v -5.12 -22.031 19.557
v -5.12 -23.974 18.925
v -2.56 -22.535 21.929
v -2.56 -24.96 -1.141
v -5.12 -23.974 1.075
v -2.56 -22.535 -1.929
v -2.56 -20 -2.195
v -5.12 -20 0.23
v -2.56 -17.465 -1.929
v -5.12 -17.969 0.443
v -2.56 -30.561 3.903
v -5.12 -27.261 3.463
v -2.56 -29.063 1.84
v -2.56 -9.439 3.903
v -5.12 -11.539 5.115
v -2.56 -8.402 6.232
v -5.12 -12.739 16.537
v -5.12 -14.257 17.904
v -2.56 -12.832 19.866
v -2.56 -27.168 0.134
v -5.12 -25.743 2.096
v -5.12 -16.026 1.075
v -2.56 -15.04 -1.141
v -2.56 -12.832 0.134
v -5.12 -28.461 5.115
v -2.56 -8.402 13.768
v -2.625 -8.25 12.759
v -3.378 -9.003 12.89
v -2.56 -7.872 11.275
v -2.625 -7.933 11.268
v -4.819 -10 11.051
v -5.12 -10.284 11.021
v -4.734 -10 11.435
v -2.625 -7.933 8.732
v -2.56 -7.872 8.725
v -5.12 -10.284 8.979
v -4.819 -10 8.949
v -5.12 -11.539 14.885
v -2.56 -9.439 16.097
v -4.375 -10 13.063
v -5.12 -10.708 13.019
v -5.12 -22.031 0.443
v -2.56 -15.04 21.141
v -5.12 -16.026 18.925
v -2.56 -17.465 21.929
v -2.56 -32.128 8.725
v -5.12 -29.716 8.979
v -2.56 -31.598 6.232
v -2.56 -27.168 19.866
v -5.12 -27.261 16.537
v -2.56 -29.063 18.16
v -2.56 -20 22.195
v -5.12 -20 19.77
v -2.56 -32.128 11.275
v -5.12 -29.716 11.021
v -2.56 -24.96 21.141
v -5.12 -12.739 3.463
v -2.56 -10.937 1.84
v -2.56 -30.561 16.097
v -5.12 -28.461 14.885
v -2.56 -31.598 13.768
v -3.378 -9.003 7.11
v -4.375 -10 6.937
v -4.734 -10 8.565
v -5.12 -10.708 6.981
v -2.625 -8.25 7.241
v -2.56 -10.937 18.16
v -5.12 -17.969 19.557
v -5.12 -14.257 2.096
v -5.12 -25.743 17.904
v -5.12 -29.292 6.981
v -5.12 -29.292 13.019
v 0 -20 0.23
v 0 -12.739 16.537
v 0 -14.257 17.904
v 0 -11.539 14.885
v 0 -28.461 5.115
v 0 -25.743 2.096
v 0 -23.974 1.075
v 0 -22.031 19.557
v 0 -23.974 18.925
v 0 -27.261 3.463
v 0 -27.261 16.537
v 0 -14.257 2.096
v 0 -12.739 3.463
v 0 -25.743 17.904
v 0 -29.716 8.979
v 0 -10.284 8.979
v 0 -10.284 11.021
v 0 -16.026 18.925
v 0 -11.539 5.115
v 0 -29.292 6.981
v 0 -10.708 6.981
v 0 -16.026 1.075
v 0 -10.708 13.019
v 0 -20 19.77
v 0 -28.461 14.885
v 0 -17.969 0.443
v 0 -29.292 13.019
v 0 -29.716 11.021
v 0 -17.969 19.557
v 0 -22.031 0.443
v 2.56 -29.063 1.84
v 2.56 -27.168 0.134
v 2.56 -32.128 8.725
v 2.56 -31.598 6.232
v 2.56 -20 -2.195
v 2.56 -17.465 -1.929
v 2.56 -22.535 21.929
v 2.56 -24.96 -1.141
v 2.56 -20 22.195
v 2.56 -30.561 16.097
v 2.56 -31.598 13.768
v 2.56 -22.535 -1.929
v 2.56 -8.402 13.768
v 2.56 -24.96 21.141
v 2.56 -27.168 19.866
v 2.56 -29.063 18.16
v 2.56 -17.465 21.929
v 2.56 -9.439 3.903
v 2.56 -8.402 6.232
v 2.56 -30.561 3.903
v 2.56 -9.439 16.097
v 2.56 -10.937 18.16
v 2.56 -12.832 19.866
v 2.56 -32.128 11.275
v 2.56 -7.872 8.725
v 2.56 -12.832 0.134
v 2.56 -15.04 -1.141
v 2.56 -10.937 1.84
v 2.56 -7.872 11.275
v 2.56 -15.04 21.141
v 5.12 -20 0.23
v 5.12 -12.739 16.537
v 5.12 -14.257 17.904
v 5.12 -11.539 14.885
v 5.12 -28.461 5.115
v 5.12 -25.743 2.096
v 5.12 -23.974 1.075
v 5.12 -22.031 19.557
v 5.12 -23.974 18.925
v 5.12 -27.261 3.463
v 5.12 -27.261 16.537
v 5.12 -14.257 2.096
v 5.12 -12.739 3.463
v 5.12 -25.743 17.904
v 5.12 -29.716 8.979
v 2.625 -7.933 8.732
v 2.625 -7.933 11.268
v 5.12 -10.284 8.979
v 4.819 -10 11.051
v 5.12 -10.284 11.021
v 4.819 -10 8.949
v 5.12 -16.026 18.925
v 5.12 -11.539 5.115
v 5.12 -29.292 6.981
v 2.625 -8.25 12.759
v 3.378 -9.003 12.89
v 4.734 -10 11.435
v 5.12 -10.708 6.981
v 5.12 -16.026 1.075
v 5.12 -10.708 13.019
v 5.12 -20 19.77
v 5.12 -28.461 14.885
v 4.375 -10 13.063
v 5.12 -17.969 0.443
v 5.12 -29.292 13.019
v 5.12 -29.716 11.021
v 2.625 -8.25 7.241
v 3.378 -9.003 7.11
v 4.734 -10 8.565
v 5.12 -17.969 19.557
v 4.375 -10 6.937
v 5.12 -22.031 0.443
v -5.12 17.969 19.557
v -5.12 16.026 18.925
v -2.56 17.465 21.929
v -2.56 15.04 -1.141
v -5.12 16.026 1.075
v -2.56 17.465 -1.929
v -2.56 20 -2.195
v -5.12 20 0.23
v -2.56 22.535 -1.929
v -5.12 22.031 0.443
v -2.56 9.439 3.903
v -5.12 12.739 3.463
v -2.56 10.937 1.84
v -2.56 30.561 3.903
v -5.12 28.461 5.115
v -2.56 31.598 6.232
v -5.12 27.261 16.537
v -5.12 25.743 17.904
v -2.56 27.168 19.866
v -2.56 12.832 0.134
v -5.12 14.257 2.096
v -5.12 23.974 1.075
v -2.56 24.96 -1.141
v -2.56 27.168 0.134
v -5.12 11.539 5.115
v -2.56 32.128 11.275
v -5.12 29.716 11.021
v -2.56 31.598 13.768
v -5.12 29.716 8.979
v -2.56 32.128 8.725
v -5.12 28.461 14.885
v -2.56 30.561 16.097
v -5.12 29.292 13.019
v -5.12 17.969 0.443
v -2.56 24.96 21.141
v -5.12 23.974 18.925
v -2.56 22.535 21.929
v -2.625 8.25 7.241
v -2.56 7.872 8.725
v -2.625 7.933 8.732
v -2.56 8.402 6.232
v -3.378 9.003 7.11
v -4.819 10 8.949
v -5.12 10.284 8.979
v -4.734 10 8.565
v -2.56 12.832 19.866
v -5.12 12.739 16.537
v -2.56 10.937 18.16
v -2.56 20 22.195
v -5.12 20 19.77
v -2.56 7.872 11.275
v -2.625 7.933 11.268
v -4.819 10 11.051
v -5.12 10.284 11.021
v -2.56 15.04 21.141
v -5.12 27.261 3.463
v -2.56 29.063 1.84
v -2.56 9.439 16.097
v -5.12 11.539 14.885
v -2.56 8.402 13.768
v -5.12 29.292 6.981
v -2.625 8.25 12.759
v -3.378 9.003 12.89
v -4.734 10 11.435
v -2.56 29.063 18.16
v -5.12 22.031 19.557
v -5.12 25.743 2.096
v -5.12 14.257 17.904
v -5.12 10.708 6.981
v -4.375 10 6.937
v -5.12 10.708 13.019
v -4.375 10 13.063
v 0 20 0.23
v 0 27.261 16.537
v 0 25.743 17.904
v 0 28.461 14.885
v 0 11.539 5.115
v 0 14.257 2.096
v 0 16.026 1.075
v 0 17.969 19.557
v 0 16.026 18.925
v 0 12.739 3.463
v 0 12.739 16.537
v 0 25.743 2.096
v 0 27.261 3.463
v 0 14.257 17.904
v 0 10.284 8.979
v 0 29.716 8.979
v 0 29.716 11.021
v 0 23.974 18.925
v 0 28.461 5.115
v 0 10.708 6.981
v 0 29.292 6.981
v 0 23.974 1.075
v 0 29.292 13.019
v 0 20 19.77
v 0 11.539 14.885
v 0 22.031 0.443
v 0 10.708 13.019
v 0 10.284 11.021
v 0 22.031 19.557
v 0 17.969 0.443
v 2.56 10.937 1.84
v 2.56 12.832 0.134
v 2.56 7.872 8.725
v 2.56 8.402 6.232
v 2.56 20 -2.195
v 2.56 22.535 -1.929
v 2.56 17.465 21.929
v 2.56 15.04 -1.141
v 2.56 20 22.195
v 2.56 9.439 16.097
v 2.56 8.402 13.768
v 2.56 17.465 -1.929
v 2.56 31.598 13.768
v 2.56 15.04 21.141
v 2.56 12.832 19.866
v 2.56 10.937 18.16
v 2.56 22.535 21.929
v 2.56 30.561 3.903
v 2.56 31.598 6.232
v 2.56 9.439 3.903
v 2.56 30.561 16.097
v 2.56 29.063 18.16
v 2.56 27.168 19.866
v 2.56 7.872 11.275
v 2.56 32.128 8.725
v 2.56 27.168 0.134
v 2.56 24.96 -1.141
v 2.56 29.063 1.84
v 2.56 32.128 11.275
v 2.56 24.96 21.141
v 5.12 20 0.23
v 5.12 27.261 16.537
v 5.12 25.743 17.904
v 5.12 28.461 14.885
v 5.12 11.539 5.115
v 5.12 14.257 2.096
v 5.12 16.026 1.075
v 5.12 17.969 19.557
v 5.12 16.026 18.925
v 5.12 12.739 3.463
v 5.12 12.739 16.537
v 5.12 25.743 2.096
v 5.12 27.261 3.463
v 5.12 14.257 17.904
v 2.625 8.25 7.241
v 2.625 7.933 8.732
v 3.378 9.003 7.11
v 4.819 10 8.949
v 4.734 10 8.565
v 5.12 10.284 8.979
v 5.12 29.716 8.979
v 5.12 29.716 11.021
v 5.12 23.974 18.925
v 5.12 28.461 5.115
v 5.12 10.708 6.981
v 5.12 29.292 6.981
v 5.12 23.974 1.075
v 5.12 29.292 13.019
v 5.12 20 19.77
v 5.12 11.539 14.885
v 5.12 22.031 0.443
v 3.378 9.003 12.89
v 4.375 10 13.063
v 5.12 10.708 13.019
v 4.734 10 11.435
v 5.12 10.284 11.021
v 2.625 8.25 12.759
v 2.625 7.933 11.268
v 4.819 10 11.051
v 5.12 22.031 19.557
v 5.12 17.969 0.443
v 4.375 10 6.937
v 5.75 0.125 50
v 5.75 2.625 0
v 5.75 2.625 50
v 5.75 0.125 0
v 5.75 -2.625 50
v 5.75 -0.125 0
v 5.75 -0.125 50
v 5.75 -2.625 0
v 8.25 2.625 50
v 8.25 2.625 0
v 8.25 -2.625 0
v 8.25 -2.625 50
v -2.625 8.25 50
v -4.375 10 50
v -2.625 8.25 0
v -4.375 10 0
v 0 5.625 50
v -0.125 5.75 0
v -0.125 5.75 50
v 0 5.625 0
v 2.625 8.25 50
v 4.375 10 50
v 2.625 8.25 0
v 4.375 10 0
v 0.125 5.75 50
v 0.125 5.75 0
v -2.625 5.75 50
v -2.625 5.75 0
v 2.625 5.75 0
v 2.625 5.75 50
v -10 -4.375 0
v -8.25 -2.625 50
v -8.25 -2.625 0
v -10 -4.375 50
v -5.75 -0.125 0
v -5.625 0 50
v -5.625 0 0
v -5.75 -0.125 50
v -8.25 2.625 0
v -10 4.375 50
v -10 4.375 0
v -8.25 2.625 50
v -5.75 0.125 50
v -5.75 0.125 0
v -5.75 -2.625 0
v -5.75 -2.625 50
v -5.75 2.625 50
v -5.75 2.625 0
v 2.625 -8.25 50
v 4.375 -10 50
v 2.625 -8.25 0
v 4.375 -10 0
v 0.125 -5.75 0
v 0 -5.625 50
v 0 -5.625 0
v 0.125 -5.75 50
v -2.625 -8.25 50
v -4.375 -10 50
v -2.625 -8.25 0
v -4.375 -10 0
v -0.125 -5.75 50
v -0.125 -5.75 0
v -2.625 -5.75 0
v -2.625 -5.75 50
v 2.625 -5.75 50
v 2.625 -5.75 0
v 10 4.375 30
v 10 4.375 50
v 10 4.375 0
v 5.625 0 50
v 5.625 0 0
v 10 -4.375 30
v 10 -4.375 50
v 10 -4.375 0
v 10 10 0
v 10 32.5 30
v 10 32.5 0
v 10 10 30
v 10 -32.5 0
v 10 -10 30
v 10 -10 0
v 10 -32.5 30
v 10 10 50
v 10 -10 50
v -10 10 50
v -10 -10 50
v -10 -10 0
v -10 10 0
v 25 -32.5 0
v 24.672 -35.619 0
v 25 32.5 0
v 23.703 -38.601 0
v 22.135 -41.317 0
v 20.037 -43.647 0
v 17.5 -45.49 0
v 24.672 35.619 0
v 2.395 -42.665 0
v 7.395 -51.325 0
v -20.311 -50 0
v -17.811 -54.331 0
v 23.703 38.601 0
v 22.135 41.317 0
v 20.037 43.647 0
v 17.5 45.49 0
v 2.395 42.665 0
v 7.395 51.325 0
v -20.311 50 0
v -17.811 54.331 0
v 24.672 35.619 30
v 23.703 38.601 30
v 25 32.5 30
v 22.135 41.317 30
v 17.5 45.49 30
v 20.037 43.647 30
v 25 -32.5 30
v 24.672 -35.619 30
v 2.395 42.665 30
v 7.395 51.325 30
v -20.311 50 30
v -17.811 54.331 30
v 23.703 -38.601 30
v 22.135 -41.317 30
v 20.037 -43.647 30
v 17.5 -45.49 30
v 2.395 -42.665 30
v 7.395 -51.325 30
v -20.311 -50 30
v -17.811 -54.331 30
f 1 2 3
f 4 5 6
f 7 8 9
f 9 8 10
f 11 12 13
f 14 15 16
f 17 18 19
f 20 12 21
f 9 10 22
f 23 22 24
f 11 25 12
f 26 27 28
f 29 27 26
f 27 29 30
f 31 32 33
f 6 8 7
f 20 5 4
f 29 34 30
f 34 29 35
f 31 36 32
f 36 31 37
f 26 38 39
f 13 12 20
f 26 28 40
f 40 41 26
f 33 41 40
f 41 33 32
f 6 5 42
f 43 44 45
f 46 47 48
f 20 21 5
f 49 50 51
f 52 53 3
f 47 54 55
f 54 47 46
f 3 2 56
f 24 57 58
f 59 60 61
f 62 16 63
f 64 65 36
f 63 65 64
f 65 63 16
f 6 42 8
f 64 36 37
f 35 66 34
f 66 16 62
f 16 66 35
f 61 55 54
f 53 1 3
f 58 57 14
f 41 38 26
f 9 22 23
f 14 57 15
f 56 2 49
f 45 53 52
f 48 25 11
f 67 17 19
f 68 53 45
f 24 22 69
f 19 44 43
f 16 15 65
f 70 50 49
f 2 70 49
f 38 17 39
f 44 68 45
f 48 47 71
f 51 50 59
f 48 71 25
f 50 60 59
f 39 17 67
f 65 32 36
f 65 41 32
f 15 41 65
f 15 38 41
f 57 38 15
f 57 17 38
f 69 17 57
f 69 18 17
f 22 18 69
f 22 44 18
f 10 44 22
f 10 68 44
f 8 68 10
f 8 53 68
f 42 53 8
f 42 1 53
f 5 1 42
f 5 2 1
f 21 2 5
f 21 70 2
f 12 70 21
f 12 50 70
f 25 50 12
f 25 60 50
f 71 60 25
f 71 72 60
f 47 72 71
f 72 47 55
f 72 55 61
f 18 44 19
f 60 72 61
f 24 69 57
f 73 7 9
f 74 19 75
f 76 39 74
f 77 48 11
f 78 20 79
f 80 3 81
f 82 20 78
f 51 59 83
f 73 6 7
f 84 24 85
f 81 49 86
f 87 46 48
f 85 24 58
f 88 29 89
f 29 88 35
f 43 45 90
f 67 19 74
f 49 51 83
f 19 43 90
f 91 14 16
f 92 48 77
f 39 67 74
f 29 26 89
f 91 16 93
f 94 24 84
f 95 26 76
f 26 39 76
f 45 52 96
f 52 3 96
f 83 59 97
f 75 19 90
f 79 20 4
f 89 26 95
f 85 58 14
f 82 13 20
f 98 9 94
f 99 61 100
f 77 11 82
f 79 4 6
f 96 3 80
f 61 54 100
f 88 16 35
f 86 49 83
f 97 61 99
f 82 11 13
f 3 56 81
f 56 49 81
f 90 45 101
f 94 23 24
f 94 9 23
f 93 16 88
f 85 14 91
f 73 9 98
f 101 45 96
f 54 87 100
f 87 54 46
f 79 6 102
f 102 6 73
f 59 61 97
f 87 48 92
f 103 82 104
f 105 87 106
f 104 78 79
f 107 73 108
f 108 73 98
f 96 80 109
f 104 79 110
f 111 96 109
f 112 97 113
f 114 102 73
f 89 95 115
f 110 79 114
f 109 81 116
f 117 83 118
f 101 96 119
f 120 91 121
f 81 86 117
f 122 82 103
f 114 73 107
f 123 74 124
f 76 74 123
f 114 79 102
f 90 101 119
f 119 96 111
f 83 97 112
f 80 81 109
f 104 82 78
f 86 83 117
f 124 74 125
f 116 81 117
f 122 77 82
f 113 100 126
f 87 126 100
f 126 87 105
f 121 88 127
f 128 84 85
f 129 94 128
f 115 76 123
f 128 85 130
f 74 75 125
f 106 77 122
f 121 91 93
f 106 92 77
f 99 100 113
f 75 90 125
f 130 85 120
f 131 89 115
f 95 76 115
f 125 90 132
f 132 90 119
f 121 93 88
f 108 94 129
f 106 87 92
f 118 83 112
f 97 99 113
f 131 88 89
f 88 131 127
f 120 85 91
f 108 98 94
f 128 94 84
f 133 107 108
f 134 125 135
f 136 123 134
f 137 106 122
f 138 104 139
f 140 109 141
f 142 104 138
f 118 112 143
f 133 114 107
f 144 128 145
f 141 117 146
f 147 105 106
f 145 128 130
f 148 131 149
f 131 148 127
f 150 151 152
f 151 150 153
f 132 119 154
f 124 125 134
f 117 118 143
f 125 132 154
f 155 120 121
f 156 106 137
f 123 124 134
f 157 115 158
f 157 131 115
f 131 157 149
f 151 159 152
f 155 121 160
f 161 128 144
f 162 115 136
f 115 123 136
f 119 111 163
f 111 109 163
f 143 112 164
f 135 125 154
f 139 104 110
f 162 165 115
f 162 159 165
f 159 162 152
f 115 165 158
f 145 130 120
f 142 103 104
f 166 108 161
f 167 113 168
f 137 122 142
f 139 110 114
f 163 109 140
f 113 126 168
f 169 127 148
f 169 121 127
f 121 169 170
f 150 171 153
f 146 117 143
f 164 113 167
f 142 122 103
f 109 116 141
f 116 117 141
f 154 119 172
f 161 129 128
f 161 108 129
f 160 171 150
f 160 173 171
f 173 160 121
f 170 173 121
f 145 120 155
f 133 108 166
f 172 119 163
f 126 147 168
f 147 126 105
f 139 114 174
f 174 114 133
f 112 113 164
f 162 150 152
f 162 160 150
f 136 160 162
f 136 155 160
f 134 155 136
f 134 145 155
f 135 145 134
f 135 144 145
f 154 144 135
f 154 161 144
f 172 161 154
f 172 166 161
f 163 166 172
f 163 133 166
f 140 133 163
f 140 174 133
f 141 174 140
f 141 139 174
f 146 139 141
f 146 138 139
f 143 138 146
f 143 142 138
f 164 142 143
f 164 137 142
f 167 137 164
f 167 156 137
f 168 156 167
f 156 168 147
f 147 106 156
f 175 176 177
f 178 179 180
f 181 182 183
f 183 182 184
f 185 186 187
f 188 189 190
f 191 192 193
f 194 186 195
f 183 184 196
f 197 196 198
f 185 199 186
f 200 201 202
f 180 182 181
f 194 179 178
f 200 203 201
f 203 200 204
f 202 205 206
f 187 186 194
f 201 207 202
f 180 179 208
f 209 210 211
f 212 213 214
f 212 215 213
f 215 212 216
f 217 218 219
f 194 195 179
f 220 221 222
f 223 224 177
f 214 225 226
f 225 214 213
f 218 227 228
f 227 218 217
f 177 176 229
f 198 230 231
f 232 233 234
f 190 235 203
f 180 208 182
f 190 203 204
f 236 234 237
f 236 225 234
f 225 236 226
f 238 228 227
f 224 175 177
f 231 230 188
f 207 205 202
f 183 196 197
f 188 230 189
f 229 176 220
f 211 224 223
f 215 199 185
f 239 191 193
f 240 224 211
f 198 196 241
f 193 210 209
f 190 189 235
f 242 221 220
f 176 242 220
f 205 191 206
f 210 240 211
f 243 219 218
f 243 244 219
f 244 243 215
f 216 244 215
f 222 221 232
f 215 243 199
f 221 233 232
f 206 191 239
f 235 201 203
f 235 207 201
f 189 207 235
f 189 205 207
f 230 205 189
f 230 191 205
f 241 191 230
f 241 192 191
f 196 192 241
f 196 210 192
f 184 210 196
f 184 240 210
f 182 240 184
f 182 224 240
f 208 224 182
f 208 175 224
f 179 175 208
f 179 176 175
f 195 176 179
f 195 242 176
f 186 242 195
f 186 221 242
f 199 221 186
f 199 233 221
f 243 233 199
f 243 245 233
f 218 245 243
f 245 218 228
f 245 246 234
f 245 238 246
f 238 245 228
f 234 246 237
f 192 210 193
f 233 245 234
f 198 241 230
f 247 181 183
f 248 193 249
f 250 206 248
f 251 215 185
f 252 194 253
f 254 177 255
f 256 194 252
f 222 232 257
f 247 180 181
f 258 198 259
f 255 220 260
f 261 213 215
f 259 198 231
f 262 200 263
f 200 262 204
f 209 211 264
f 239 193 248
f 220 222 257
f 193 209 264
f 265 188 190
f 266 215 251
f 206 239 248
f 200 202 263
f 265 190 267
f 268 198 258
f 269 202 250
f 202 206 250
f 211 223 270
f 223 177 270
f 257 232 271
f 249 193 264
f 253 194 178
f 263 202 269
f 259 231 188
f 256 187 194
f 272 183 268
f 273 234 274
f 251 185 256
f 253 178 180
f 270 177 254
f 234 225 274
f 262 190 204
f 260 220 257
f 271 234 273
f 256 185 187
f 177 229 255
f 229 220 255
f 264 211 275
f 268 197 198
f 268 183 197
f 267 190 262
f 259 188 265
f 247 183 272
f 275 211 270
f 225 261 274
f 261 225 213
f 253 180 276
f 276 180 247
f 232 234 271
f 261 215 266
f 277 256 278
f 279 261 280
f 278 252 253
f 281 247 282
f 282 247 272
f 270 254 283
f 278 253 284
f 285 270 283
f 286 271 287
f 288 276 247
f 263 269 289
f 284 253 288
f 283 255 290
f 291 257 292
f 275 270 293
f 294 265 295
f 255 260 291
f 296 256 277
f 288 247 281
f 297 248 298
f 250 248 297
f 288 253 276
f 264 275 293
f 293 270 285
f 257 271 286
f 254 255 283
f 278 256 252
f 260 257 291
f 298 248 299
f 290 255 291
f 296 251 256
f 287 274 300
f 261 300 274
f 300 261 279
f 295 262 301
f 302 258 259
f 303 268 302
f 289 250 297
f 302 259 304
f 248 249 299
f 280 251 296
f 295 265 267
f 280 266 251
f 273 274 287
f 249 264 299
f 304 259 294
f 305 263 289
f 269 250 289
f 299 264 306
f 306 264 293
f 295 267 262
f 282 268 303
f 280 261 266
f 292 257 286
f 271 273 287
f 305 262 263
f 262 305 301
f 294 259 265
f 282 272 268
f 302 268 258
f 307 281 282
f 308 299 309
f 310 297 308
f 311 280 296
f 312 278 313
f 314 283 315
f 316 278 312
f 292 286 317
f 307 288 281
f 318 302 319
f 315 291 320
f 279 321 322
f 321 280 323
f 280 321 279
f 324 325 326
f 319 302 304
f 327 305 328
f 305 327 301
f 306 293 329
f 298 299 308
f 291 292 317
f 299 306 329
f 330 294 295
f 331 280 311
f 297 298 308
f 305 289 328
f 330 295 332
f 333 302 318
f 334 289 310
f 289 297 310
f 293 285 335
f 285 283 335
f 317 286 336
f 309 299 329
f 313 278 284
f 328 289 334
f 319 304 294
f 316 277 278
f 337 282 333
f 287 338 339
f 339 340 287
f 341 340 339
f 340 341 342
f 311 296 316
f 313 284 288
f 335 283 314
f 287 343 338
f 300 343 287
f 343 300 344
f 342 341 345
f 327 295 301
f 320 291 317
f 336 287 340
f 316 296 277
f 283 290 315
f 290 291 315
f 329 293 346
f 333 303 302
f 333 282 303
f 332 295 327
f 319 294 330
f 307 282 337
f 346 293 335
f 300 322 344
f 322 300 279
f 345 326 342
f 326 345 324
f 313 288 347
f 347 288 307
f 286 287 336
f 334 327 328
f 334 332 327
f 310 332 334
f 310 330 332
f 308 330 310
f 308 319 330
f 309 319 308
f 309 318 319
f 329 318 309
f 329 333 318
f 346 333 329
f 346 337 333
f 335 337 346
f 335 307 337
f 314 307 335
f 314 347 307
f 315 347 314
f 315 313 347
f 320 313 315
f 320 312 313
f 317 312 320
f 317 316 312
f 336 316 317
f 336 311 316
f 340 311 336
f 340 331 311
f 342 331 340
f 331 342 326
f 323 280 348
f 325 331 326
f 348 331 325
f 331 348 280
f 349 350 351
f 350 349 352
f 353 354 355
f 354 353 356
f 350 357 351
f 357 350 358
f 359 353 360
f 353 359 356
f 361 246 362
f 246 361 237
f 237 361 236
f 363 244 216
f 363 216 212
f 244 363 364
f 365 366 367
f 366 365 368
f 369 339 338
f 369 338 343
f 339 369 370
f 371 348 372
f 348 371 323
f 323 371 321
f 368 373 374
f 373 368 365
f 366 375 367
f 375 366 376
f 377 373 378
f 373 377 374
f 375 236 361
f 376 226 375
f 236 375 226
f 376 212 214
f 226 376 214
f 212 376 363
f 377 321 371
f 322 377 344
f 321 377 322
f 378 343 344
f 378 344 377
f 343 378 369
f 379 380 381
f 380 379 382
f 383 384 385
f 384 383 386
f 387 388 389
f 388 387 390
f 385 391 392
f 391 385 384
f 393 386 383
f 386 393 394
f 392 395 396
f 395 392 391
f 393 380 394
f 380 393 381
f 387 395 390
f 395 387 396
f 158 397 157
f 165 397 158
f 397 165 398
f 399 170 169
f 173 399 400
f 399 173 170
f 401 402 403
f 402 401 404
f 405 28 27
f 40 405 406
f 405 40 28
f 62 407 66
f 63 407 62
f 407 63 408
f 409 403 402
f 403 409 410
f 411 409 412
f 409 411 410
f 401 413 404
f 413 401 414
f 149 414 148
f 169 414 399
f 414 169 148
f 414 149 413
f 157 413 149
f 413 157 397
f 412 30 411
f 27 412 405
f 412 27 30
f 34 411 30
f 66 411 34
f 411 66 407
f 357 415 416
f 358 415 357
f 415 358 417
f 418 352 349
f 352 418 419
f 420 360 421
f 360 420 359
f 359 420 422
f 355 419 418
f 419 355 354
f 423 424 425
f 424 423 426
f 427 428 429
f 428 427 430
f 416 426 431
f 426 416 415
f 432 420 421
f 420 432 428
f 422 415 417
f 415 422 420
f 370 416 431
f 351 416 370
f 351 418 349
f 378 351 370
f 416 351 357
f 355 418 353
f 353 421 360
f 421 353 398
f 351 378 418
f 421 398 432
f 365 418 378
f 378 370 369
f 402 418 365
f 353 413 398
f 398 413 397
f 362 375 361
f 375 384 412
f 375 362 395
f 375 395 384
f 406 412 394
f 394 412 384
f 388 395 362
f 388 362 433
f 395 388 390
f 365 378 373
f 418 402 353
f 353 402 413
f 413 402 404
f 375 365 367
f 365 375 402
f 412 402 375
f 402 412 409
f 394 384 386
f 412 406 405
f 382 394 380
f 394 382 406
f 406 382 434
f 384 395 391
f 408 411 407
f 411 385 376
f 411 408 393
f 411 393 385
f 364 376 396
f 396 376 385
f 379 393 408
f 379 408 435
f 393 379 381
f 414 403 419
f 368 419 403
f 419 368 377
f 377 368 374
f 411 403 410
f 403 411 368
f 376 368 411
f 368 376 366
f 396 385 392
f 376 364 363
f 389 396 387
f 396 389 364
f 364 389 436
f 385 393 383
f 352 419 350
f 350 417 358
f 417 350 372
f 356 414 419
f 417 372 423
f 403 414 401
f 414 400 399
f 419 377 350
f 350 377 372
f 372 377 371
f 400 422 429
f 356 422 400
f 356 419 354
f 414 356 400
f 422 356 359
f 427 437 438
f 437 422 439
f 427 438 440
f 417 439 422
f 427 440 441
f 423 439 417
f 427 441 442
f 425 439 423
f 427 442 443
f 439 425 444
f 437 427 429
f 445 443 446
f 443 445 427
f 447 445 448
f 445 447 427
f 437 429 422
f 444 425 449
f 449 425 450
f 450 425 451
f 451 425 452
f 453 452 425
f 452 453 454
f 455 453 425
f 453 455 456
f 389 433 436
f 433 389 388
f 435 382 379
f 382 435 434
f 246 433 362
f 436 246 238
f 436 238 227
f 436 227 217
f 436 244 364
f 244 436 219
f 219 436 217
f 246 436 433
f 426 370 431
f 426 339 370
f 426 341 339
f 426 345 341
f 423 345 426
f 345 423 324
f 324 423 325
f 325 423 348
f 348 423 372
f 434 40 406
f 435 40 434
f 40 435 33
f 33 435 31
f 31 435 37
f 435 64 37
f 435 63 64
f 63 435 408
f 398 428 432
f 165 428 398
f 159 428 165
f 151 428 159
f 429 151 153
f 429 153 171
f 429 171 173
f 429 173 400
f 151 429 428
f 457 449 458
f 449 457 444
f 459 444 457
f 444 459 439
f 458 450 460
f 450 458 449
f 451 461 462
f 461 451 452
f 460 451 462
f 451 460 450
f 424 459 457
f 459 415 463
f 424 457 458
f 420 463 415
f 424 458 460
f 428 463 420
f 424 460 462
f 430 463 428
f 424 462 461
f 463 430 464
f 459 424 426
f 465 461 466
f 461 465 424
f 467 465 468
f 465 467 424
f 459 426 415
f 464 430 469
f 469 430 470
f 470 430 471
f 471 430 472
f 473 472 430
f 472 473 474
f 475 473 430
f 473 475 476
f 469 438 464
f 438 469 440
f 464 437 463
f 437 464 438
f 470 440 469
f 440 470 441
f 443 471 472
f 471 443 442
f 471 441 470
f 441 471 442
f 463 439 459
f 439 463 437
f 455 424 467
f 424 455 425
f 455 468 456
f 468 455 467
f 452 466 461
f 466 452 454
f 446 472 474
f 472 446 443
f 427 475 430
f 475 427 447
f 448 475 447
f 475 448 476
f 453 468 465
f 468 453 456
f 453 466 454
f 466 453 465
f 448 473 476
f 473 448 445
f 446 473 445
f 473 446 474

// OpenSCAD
// file: ../configuration.scad
// Increase this if your slicer or printer make holes too tight.
extra_radius = 0.25;

// OD = outside diameter, corner to corner.
m3_nut_od = 6.1; //6.1 for 1515
m3_nut_radius = m3_nut_od/2 + 0.2 + extra_radius;
m3_washer_radius = 3.5 + extra_radius;


// Major diameter of metric 3mm thread.
m3_major = 2.85;
m3_radius = m3_major/2 + extra_radius;
m3_wide_radius = m3_major/2 + extra_radius + 0.2;


m5_nut_od = 8; 
m5_nut_radius = m5_nut_od/2 + 0.2 + extra_radius;
m5_washer_radius = 3.5 + extra_radius;

// Major Diameter of metric 5mm thread
m5_major = 5;
m5_radius = m5_major/2 + extra_radius;
m5_wide_radius = m5_major/2 + extra_radius + 0.2;

m5_cap_major = 8.5;
m5_cap_radius = m5_cap_major/2 + extra_radius;


// NEMA17 stepper motors.
motor_shaft_diameter = 5;
motor_shaft_radius = motor_shaft_diameter/2 + extra_radius;

// Frame brackets. M3x8mm screws work best with 3.6 mm brackets.
thickness = 4;

// OpenBeam or Misumi. Currently only 15x15 mm, but there is a plan
// to make models more parametric and allow 20x20 mm in the future.
extrusion = 20;
extrusion_channel_w = 5; //use 3 for 1515
extrusion_channel_d = 3; //use 3 for 1515
extrusion_fin_d = 1;

vertex_radius = 40.5; //set to 36 for 1515
vertex_x_offset = 7.25; // offset of the horizontal extrusion to the vertical one in X axis
vertex_y_offset = 39 ;//27; // offset of the horizontal extrusion to the vertical one in Y axis


// Placement for the NEMA17 stepper motors.
motor_offset = 44;
motor_length = 47;
// file: ../vertex.scad
include <configuration.scad>;

$fn = 80;
roundness = 6;

body1_cylinder_offset = 22;  //22
body2_cylinder_offset = -30; //-37

module extrusion_cutout(h, extra, cut_w=2, cut_d=2, corner_r=0.5) {
	difference() {
		union(){
			cube([extrusion+extra, extrusion+extra, h], center=true);
			translate([(extrusion-corner_r)/2,(extrusion-corner_r)/2,0]) cylinder(h=h, r=corner_r,center=true);
			translate([(extrusion-corner_r)/2,-(extrusion-corner_r)/2,0]) cylinder(h=h, r=corner_r,center=true);
			translate([-(extrusion-corner_r)/2,(extrusion-corner_r)/2,0]) cylinder(h=h, r=corner_r,center=true);
			translate([-(extrusion-corner_r)/2,-(extrusion-corner_r)/2,0]) cylinder(h=h, r=corner_r,center=true);
		}
		for (a = [0:90:359]) rotate([0, 0, a]) {
			translate([(extrusion-cut_d)/2+0.5, 0, 0]) cube([cut_d, cut_w, h+1], center=true);
		}

	}
}

module screw_socket() {
	cylinder(r=m5_wide_radius, h=20, center=true);
	translate([0, 0, 3.8]) cylinder(r=m5_cap_radius, h=8);
}

module screw_socket_cone() {
	union() {
		screw_socket();
		scale([1, 2, -1]) rotate(45)cylinder(r1=11/2*sqrt(2), r2=extrusion/2, h=5.5, $fn=4);
	}
}

module fin(fin_l=50, fin_w=2, fin_d=2){
	translate([0,0,-3.65])rotate([45,0,0])cube([fin_l,2,3,],center=true);
	rotate([90,22.5,90])cylinder(h=fin_l, r=fin_d/2, center=true, $fn = 8);
	//echo("In fin");
}

module vertex(height, idler_offset, idler_space, fin_w=5, fin_d=2, fins=0, fn=180) {

	fin_w = 5.8;
	translate([0,2.5,0])union() {
		// Pads to improve print bed adhesion for slim ends.
		translate([-37.5, 52.2, -height/2]) cylinder(r=8, h=0.4);
		translate([37.5, 52.2, -height/2]) cylinder(r=8, h=0.4);



		difference() {
			union() {
				//fins
				if(fins > 0){
					translate([29.5,35,(height-extrusion)/2]) rotate([0,0,60])  
					difference(){ 
						fin(54,fin_d,fin_w+2);
						translate([-16,-1.6,0])rotate([90,45,0]) cylinder(r=9, h=5.5, $fn=4);
						translate([18,-1.6,0])rotate([90,45,0]) cylinder(r=9, h=5.5, $fn=4);
					}
					translate([29.5,35,-(height-extrusion)/2]) rotate([0,0,60]) 
					difference(){ 
						fin(54,fin_d,fin_w+2);
						translate([-16,-1.6,0])rotate([90,45,0]) cylinder(r=9, h=5.5, $fn=4);
						translate([18,-1.6,0])rotate([90,45,0]) cylinder(r=9, h=5.5, $fn=4);
					}
					translate([-29.5,35,(height-extrusion)/2]) rotate([0,0,-60]) 
					difference(){ 
						fin(54,fin_d,fin_w+2);
						translate([-18,-1.6,0])rotate([90,45,0]) cylinder(r=9, h=5.5, $fn=4);
						translate([16,-1.6,0])rotate([90,45,0]) cylinder(r=9, h=5.5, $fn=4);
					}
					
					translate([-29.5,35,-(height-extrusion)/2]) rotate([0,0,-60]) 
					difference(){ 
						fin(54,fin_d,fin_w+2);
						translate([-18,-1.6,0])rotate([90,45,0]) cylinder(r=9, h=5.5, $fn=4);
						translate([16,-1.6,0])rotate([90,45,0]) cylinder(r=9, h=5.5, $fn=4);
					}
				}
				intersection() {
					translate([0, body1_cylinder_offset, 0]) cylinder(r=vertex_radius, h=height, center=true, $fn=fn*2);
					translate([0, body2_cylinder_offset, 0]) rotate([0, 0, 30]) cylinder(r=50, h=height+1, center=true, $fn=6);
				}
				translate([0, 38, 0]) intersection() {
					rotate([0, 0, -90]) cylinder(r=55, h=height, center=true, $fn=3);
					translate([0, 10, 0]) cube([100, 100, 2*height], center=true);
					translate([0, -10, 0]) rotate([0, 0, 30]) cylinder(r=55, h=height+1, center=true, $fn=6);
				}
			}
			difference() {   
				translate([0, 58, 0]) minkowski() {
					intersection() {
						rotate([0, 0, -90]) cylinder(r=55, h=height, center=true, $fn=3);
						translate([0, -31, 0])  cube([100, 15, 2*height], center=true);
					}
					cylinder(r=roundness, h=1, center=true);
				}

				// Idler support cones.
				translate([0, 26+idler_offset-30, 0]) rotate([-90, 0, 0]) cylinder(r1=30, r2=2, h=30-idler_space/2, $fn=fn);
				translate([0, 26+idler_offset+30, 0]) rotate([90, 0, 0])  cylinder(r1=30, r2=2, h=30-idler_space/2, $fn=fn);
			}

			translate([0, 58, 0]) minkowski() {
				intersection() {
					rotate([0, 0, -90]) cylinder(r=55, h=height, center=true, $fn=3);
					translate([0, 7, 0]) cube([100, 30, 2*height], center=true);
				}
				cylinder(r=roundness, h=1, center=true);
			}

			translate([0,-2.5,0])extrusion_cutout(height+10, 0.15, fin_w, fin_d,corner_r=1);

			for (z = [-height/2 + extrusion/2 , height/2 - extrusion/2] ) {
				translate([0, -extrusion/2-extra_radius+extrusion_fin_d-2.5, z]) rotate([90, 0, 0]) screw_socket_cone();
				for (a = [-1, 1]) {
					rotate([0, 0, 30*a]) translate([-(vertex_radius-body1_cylinder_offset)*a, 111, z]) {
						// % rotate([90, 0, 0]) extrusion_cutout(200, 0);
						// Screw sockets.
						for (y = [-82, -48]) {
							translate([a*(extrusion/2-0.6), y, 0]) rotate([0, a*90, 0]) screw_socket();
						}
						
						// Nut tunnels.
						for (z = [-1, 1]) {
							scale([1, 1, z]) 
							translate([0, -99, 3]) 
							minkowski() {
								rotate([0, 0, -a*30]) cylinder(r=5, h=16); //cylinder(r=m3_nut_radius, h=16);
								cube([0.1, 8, 0.1], center=true);
							}
						}
					}
				}
			}
			// ease the inside coners
			rotate(-30)translate([vertex_x_offset+2,-2.5+vertex_y_offset/2+1,0])cylinder(h=height+1, r=1, center=true);
			rotate(30)translate([-vertex_x_offset-2,-2.5+vertex_y_offset/2+1,0])cylinder(h=height+1, r=1, center=true);
		}
	}
}



translate([0, 0, extrusion*2.5/2]) 
vertex(extrusion*2.5, idler_offset=0, idler_space=10, fin_w=5, fin_d=4, fins=1, fn=20 );


//use <Lateral_Brace/LateralBrace.scad>
//rotate([0,0,270])brace();
//translate([34.5,25,10])rotate([30-90,90,0])Extrusion(height = 30);


//translate([0, 0, 7.5]) vertex_cover(3);

//%rotate(-30)cube([45,vertex_y_offset/2,25]);
//%rotate(-30)cube([vertex_x_offset,45,35]);
/*
//%rotate(-30)cube([45,vertex_y_offset/2,25]);
color("gray")rotate(-30)translate([(extrusion-thickness)/2,vertex_y_offset/2,0])
difference(){ 
cube([extrusion,240,extrusion]);
translate([(extrusion-extrusion_channel_w)/2,-1,extrusion-6]) cube([extrusion_channel_w,241,extrusion]);
}
*/
/*
color("gray")
rotate(-30)translate([(extrusion-thickness)/2,vertex_y_offset/2,0])
translate([10,0,10+30])rotate([-90,0,0])
difference(){
	import("./assembly/2020_1000mm.stl", convexity=10);
	translate([-12,-12,240])cube([24,24,(1000-240)+2]);
}

#translate([sin(30)*(vertex_y_offset+240),cos(30)*(vertex_y_offset+240),0])rotate(120)
translate([0, 0, extrusion*2.5/2]) vertex(extrusion*2.5, idler_offset=0, idler_space=10, fin_w=5, fin_d=4, fn=20 );
translate([sin(30)*(vertex_y_offset/2+240),cos(30)*(vertex_y_offset/2+240),-1])%rotate(-30)cube([45,vertex_y_offset/2,25]);
*/
// main file
$fn=30;
use <../vertex.scad>
//#translate([-26.475,-22.575,0])import (file = "V-slot 2020_fullscale.dxf");
//translate([30,0,-15])import("v-slot_endcap_2020.stl");

extrusion = 20;


module Extrusion(height = 10, cut_d=4.5, cut_w=5.5, extra = .25){
	cut_d = cut_d-extra;
	cut_w = cut_w-extra;
	difference(){
		translate([-extrusion/2,-extrusion/2,0]) cube([extrusion,extrusion,height]);

		for(i = [0:3]){
			rotate([0,0,90*i]){
				translate([extrusion/2-cut_d,-cut_w/2,-1])cube([cut_d,cut_w,height+2]);
				translate([0,5.375+extra,-1])rotate([0,0,45])cube([10,10,height+2]);
			}
		}
	}
	for(i=[0:3]){
	rotate([0,0,90*i]){
	//translate([extrusion/2,extrusion/2,-1])cylinder(r=1, h=height+2);
	}
	}
}
module wheel(){
translate([-5.12,0,0])
rotate([0,90,0]){
cylinder(r1=9.77, r2=24.39/2, h=5.12/2);
translate([0,0,5.12/2])cylinder(r1=24.39/2, r2=9.77, h=5.12/2);
translate([0,0,5.12])cylinder(r1=9.77, r2=24.39/2, h=5.12/2);
translate([0,0,5.12/2*3])cylinder(r1=24.39/2, r2=9.77, h=5.12/2);
}
}
module corner(brc_d, brc_h){
intersection(){
cylinder(r=brc_d, h = brc_h);
translate([0,-brc_d,0])cube([brc_d,brc_d*2,brc_h]);
rotate([0,0,60])translate([0,-brc_d,0])cube([brc_d,brc_d*2,brc_h]);
}
}


translate([0,-20,10])wheel();
translate([0,20,10])wheel();
Extrusion(height = 50);


module brace(){
sin60 = 0.86602540378443864676372317075294;
cos60 = (1/2);

brc_w = 65;
brc_h = 30;
brc_d = 15;
brc_wng = 35;
brc_wing_off_x = -13;
brc_wing_off_y = 16;
sheet_thick = 10;
brc_wing_pos_x = (brc_w/2+brc_d/2+.79-sheet_thick)*cos60+brc_wing_off_x;
brc_wing_pos_y = (brc_w/2+brc_d/2+.79-sheet_thick)*sin60+brc_wing_off_y;



difference(){
union(){
translate([10,-brc_w/2,0])cube([brc_d,brc_w,brc_h]);
			   translate([10,brc_w/2,0])rotate([0,0,60])cube([brc_d,brc_wng,brc_h]);
mirror([0,1,0])translate([10,brc_w/2,0])rotate([0,0,60])cube([brc_d,brc_wng,brc_h]);
translate([10,brc_w/2,0])
corner(brc_d,brc_h);
mirror([0,1,0])
translate([10,brc_w/2,0])
corner(brc_d,brc_h);

}
			  #translate([brc_wing_pos_x,brc_wing_pos_y,-1])rotate([0,0,60])cube([brc_d,brc_wng,brc_h+2]);
#mirror([0,1,0])translate([brc_wing_pos_x,brc_wing_pos_y,-1])rotate([0,0,60])cube([brc_d,brc_wng,brc_h+2]);
}
}

brace();
